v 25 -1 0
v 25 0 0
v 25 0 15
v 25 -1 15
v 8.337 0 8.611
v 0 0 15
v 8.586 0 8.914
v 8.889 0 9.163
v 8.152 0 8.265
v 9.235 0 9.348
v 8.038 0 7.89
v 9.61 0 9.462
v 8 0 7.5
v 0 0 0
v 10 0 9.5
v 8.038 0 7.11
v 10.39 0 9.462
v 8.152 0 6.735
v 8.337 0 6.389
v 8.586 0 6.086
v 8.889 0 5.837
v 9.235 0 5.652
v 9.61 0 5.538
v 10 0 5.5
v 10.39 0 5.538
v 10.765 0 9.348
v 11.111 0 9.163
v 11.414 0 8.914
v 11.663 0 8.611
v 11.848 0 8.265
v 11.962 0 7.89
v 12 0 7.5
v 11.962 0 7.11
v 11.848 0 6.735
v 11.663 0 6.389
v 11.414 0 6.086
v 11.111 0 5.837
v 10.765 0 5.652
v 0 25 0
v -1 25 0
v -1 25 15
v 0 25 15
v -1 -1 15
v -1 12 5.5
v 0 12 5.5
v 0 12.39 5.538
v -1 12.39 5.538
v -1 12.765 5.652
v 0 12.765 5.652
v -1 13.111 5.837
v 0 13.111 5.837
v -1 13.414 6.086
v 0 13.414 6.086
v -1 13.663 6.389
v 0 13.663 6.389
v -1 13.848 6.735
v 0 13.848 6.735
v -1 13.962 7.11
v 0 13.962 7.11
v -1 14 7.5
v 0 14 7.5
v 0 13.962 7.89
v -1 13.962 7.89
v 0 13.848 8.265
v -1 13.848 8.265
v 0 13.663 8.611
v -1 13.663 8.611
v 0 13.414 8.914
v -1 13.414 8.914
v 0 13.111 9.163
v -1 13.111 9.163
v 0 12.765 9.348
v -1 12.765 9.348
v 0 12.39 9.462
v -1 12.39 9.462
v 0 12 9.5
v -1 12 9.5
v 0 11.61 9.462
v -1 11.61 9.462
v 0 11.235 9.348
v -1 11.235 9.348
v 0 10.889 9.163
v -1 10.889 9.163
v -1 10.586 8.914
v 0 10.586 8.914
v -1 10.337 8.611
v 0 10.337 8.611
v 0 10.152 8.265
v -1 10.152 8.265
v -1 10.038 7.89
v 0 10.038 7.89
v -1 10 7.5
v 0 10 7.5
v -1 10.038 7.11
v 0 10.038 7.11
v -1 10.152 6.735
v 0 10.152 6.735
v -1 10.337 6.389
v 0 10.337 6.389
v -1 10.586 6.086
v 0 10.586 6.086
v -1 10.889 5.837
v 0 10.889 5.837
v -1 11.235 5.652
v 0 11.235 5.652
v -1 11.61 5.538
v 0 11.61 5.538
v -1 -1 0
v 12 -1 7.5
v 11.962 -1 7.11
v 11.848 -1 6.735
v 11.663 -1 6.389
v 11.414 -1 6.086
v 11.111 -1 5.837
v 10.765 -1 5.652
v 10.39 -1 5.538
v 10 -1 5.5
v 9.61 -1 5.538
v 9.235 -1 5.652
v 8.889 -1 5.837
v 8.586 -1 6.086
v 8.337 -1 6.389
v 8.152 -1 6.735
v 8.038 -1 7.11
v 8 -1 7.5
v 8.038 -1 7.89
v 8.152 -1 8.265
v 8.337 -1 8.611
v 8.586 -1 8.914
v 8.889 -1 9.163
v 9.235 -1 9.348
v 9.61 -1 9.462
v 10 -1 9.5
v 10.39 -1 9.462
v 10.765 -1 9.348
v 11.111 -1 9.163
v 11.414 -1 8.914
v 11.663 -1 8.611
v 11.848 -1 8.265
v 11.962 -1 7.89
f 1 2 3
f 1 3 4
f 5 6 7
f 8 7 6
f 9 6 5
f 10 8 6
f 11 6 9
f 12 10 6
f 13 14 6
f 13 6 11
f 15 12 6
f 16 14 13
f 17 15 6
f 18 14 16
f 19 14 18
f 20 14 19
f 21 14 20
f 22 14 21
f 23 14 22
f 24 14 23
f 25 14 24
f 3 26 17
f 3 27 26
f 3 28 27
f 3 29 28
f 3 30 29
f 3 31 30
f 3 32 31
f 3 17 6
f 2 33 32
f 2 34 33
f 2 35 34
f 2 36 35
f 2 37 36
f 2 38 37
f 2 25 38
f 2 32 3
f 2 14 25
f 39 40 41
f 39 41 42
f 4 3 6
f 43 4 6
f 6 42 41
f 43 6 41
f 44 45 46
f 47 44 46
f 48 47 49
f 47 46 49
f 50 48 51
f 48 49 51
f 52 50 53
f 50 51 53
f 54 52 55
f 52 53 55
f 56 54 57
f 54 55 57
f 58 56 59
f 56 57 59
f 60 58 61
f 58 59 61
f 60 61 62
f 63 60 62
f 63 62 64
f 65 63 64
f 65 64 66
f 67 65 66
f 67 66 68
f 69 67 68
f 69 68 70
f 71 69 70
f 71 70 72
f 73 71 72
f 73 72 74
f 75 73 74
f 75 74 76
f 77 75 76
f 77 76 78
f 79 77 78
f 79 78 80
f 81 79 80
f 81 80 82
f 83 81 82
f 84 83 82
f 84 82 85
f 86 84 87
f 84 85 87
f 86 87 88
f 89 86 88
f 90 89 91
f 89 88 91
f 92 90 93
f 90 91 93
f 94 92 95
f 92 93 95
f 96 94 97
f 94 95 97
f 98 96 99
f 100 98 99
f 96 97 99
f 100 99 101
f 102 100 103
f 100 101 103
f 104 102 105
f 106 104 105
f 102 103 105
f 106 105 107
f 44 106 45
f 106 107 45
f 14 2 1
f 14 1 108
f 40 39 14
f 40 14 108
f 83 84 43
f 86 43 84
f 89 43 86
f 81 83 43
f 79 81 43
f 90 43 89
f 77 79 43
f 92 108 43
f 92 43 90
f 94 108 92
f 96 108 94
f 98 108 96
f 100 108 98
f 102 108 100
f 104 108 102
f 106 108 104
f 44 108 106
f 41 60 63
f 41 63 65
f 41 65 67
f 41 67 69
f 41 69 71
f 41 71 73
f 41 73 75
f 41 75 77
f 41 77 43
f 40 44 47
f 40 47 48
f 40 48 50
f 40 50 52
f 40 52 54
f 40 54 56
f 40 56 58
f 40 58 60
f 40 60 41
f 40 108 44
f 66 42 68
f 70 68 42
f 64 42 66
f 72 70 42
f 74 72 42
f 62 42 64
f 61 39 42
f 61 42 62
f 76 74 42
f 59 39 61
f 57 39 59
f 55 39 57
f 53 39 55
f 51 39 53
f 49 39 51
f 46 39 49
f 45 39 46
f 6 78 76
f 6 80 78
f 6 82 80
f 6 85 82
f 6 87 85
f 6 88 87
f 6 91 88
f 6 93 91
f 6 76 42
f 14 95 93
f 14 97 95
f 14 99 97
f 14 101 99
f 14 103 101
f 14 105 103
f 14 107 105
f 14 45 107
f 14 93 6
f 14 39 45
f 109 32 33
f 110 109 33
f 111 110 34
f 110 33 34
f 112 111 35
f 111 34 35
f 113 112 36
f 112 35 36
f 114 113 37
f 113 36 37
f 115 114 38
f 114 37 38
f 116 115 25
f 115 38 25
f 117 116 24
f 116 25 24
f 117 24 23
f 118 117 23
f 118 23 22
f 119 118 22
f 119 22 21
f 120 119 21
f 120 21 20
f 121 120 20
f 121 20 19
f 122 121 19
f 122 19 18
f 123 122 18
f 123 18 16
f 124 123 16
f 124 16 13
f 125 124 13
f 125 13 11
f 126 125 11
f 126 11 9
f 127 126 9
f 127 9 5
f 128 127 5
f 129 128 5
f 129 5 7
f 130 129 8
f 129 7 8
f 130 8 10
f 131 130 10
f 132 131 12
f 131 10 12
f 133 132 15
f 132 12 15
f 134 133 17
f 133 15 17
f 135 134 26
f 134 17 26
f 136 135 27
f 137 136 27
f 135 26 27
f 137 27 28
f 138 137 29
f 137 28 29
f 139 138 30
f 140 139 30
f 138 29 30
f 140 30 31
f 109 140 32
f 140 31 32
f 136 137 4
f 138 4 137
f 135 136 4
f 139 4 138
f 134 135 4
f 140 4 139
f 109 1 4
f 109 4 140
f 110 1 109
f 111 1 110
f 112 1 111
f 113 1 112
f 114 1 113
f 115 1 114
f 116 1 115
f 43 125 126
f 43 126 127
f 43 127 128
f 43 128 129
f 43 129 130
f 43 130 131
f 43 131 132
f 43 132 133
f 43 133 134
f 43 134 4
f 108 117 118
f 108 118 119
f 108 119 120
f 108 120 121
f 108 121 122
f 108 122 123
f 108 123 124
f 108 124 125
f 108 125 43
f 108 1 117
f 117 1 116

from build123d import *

# Parameters (mm, degrees)
RESSALTO_EXTRUS_O1_DEPTH = 15
ESBO_O2_R                = 2
CORTE_EXTRUS_O1_DEPTH    = 15
ESBO_O3_R                = 2
CORTE_EXTRUS_O2_DEPTH    = 10


with BuildPart() as part:
    # Esboço1 → Ressalto-extrusão1 (new body)
    with BuildSketch(Plane.XY):
        Polygon((0, 0), (25, 0), (25, -1), (-1, -1), (-1, 25), (0, 25), align=None)
    extrude(amount=RESSALTO_EXTRUS_O1_DEPTH)

    # Esboço2 → Corte-extrusão1 (cut)
    with BuildSketch(Plane(origin=(0, 0, 0), x_dir=(0, 0, -1), z_dir=(1, 0, 0))):
        with Locations((-7.5, 12)):
            Circle(ESBO_O2_R)
    extrude(amount=-CORTE_EXTRUS_O1_DEPTH, mode=Mode.SUBTRACT)

    # Esboço3 → Corte-extrusão2 (cut)
    with BuildSketch(Plane(origin=(0, 0, 0), x_dir=(1, 0, 0), z_dir=(0, 1, 0))):
        with Locations((10, -7.5)):
            Circle(ESBO_O3_R)
    extrude(amount=-CORTE_EXTRUS_O2_DEPTH, mode=Mode.SUBTRACT)


solid = part.part
